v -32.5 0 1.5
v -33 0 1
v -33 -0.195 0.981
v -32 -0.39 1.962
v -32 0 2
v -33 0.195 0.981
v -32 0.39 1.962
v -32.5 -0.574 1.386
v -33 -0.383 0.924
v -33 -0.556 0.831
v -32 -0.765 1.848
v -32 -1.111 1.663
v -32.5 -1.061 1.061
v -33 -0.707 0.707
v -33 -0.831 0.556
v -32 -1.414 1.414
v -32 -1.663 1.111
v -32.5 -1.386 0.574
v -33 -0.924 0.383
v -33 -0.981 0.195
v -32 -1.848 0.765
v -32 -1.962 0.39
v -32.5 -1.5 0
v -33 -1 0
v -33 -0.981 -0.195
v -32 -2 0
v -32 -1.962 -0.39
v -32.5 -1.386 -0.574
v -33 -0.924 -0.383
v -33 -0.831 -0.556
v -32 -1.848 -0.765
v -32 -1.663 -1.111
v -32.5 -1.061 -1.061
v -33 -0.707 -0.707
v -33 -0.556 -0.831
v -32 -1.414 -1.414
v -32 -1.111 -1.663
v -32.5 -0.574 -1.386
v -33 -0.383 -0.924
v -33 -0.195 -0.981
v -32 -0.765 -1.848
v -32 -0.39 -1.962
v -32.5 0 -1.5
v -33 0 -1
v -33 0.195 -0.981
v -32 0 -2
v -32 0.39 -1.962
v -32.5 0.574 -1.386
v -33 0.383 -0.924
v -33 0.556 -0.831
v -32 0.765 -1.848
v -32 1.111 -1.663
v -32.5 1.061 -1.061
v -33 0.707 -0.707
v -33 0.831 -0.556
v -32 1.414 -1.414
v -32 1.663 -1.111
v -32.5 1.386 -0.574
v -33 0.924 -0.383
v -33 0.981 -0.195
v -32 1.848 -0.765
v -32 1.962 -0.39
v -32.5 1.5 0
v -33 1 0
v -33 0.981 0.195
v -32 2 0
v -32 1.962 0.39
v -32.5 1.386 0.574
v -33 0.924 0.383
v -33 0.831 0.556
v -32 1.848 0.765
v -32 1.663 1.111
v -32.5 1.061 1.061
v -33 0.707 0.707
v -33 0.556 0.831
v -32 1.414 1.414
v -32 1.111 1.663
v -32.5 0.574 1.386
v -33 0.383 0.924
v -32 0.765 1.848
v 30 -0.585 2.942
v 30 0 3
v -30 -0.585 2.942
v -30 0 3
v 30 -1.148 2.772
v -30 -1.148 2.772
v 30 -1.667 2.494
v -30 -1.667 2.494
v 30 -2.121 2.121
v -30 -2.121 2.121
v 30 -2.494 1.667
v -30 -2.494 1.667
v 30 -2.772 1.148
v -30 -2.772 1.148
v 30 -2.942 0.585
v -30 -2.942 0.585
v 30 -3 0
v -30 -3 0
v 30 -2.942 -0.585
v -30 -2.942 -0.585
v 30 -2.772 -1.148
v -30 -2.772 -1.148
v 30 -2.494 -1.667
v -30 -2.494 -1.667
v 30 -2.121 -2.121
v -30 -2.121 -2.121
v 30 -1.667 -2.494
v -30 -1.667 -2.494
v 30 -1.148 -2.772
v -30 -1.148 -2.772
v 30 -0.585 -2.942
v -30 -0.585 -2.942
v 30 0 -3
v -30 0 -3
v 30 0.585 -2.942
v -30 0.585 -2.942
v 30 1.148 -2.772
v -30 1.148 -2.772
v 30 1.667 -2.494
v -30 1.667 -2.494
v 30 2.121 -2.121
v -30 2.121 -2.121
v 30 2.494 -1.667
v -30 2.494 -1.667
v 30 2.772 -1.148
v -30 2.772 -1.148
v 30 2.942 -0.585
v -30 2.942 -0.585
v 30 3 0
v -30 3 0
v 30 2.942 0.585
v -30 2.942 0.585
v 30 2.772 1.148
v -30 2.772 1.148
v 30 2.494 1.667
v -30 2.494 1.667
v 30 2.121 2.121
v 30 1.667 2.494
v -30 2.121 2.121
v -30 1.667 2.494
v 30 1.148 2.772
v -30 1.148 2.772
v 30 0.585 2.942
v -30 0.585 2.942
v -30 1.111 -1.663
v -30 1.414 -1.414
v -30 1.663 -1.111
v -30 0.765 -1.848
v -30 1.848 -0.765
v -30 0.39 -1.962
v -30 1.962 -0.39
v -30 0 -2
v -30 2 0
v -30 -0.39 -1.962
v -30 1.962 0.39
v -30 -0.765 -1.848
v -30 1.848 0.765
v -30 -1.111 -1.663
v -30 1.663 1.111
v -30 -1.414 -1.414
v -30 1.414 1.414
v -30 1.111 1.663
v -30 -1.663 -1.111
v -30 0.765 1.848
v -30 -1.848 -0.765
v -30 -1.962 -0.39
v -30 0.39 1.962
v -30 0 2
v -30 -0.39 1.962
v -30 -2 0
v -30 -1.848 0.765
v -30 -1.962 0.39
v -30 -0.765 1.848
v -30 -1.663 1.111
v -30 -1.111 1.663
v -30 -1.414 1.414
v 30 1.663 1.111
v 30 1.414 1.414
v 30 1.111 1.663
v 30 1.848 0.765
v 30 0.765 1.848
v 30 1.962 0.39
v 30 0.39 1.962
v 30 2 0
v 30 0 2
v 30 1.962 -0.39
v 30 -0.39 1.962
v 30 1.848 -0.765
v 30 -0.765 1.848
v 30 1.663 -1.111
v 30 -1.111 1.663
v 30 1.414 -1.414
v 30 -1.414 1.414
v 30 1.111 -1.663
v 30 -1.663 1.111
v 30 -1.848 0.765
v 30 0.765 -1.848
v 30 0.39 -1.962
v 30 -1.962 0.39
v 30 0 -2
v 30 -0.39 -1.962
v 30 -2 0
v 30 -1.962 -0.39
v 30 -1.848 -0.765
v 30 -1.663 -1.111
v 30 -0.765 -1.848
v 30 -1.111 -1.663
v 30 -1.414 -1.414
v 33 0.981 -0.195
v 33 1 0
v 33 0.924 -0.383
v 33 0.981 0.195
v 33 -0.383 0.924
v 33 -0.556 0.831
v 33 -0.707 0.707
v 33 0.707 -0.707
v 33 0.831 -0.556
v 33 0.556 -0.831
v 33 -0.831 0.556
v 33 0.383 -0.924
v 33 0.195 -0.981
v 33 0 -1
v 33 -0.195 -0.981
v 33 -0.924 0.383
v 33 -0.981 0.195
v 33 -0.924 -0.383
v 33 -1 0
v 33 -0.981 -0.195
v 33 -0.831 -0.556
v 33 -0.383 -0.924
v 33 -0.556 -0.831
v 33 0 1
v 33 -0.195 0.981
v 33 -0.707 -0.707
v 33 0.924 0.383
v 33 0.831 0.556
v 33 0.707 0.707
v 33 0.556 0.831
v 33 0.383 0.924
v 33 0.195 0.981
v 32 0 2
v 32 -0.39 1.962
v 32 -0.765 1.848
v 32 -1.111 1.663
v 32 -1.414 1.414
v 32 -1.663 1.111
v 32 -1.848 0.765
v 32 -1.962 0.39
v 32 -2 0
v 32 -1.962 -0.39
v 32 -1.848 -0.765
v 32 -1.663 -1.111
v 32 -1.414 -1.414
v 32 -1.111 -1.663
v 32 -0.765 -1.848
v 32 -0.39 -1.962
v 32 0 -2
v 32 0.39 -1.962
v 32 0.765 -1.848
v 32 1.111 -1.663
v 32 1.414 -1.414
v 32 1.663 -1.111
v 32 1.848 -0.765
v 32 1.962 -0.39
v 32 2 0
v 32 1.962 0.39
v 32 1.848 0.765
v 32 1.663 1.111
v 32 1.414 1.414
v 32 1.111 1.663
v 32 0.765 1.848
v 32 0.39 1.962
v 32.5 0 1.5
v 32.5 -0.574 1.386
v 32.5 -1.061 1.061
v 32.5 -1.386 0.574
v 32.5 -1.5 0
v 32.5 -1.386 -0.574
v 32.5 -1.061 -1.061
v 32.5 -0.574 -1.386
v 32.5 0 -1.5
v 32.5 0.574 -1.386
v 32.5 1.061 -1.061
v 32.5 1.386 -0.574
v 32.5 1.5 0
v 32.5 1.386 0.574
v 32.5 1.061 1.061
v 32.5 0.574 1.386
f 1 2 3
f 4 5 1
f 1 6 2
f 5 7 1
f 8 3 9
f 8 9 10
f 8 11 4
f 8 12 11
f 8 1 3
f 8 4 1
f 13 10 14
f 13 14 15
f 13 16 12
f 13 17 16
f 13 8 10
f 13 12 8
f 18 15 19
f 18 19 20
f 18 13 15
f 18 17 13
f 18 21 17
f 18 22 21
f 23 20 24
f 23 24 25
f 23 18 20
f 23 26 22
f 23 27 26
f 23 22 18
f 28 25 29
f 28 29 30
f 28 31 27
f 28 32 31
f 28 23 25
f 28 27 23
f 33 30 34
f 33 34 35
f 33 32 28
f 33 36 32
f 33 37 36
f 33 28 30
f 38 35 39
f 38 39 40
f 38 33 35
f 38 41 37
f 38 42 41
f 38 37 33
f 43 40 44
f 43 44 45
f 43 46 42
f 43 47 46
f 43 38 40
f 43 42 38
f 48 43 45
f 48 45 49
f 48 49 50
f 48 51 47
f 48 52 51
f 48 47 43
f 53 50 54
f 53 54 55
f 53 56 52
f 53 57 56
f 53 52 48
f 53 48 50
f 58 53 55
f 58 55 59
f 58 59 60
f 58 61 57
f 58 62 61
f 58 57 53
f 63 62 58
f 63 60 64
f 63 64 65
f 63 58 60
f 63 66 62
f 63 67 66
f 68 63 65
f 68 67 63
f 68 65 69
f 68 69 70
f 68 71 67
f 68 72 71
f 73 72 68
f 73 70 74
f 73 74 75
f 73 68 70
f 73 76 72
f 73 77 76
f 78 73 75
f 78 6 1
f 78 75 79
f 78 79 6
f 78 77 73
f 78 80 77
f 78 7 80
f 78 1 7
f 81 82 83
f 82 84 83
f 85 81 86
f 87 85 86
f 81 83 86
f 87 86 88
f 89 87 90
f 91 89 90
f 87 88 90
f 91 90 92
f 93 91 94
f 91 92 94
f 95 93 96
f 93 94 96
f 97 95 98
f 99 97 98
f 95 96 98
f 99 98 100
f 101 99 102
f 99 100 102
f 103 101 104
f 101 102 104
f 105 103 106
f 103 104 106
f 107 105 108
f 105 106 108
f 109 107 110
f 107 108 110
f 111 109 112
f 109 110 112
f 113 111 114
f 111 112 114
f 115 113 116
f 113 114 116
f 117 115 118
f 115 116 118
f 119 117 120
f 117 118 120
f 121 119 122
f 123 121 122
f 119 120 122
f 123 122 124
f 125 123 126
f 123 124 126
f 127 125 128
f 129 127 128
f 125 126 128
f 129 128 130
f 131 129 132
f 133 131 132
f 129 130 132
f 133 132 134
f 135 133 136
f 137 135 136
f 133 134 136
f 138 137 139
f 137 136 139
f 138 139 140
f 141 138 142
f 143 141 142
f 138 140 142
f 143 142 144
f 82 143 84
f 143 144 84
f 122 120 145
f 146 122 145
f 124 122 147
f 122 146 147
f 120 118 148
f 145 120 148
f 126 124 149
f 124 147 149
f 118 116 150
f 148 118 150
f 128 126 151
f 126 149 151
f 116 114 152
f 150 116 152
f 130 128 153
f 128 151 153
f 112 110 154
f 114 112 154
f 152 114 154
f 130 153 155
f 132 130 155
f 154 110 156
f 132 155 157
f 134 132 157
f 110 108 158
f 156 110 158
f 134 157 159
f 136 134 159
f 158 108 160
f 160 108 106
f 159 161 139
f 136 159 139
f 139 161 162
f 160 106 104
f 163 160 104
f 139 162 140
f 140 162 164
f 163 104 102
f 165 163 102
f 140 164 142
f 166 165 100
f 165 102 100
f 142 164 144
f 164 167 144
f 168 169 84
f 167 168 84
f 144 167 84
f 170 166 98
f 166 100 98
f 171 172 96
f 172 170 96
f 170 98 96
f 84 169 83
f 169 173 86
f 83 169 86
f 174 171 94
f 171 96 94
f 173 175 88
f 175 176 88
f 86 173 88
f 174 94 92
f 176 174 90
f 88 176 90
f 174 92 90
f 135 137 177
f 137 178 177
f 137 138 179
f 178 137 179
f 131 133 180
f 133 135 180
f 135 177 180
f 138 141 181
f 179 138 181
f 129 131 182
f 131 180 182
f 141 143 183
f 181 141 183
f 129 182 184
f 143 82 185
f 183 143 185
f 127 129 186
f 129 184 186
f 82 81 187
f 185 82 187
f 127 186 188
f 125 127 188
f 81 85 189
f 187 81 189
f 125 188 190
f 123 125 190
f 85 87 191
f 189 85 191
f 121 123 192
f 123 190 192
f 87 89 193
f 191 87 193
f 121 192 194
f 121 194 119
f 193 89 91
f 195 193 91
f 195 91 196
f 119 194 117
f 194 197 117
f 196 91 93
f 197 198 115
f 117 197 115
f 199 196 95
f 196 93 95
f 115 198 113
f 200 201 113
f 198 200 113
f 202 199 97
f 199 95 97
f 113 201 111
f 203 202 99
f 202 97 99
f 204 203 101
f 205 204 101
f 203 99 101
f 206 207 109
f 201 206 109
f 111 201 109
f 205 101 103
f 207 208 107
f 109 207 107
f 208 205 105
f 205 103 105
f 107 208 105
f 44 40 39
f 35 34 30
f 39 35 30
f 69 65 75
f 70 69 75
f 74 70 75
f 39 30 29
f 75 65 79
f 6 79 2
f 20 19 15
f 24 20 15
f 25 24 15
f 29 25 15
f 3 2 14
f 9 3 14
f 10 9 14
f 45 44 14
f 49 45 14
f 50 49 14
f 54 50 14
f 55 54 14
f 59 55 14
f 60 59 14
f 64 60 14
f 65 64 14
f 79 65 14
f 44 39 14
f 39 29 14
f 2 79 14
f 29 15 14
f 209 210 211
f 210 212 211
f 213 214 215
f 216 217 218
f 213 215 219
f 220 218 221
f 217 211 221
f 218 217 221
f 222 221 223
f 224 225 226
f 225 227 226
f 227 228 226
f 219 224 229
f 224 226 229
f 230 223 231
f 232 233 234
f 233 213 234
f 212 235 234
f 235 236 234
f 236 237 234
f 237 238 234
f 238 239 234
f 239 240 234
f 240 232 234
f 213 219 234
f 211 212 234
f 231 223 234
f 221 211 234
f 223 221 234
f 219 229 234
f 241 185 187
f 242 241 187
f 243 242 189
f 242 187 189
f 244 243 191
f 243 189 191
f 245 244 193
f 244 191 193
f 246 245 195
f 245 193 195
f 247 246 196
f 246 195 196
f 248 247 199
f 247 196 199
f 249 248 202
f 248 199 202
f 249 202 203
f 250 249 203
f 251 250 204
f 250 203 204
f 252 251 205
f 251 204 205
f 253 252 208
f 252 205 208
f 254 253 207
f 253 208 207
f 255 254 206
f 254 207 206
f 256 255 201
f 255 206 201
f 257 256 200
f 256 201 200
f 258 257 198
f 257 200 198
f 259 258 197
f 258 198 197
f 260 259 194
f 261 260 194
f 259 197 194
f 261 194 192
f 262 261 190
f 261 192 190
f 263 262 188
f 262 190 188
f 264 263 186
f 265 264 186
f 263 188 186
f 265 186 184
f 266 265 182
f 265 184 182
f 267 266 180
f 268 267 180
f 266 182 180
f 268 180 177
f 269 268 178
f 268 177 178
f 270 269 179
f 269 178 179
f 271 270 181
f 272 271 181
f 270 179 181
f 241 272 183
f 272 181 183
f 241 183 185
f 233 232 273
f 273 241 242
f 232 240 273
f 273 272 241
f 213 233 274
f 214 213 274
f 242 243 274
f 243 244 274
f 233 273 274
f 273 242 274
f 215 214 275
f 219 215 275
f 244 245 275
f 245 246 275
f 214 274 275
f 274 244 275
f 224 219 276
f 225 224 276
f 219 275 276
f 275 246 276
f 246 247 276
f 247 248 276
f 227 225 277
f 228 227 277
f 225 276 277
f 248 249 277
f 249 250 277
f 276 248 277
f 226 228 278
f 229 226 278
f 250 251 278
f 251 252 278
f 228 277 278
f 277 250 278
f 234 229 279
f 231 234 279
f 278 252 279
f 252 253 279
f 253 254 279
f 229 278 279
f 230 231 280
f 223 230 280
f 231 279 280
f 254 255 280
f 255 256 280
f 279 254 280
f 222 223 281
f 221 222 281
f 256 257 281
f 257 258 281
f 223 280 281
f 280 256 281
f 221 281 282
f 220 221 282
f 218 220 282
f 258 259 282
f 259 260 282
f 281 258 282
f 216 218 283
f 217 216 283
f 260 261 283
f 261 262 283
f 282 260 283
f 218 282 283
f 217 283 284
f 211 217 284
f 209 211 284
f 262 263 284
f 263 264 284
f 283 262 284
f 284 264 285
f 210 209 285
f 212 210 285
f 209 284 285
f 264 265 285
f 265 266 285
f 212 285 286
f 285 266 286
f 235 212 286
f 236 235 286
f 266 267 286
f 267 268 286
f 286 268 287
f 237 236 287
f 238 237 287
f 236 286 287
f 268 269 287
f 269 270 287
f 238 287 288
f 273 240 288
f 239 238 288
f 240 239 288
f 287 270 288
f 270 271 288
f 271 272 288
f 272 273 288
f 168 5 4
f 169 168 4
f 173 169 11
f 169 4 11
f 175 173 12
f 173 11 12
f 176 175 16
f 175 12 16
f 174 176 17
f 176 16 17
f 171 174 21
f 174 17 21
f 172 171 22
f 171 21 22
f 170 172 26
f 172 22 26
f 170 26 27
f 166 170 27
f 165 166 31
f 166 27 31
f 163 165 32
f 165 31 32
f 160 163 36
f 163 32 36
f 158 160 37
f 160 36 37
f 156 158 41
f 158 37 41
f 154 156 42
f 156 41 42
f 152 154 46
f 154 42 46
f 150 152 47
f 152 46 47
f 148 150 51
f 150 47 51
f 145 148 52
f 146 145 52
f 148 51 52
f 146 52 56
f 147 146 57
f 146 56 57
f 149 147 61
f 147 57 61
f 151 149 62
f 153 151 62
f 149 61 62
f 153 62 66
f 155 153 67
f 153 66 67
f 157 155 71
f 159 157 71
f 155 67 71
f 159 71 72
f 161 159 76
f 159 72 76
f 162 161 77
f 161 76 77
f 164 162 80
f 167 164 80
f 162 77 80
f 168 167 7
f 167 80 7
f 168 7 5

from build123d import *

# Parameters (mm, degrees)
CHANFREIN1_SIZE = 1


with BuildPart() as part:
    # Esquisse1 → Base-Révolution (revolve)
    with BuildSketch(Plane.XY, mode=Mode.PRIVATE) as base_r_volution_sk:
        Polygon((-33, 2), (-33, 0), (33, 0), (33, 2), (30, 2), (30, 3), (-30, 3), (-30, 2), align=None)
    revolve(base_r_volution_sk.sketch.rotate(Axis((-77, 0, 0), (1, 0, 0)), 90), axis=Axis((-77, 0, 0), (1, 0, 0)))

    # Chanfrein1
    chanfrein1_edges = [part.edges().sort_by_distance(p)[0] for p in [
        (-33, 0, -2),
        (33, 0, -2),
    ]]
    chamfer(chanfrein1_edges, length=CHANFREIN1_SIZE)


solid = part.part
